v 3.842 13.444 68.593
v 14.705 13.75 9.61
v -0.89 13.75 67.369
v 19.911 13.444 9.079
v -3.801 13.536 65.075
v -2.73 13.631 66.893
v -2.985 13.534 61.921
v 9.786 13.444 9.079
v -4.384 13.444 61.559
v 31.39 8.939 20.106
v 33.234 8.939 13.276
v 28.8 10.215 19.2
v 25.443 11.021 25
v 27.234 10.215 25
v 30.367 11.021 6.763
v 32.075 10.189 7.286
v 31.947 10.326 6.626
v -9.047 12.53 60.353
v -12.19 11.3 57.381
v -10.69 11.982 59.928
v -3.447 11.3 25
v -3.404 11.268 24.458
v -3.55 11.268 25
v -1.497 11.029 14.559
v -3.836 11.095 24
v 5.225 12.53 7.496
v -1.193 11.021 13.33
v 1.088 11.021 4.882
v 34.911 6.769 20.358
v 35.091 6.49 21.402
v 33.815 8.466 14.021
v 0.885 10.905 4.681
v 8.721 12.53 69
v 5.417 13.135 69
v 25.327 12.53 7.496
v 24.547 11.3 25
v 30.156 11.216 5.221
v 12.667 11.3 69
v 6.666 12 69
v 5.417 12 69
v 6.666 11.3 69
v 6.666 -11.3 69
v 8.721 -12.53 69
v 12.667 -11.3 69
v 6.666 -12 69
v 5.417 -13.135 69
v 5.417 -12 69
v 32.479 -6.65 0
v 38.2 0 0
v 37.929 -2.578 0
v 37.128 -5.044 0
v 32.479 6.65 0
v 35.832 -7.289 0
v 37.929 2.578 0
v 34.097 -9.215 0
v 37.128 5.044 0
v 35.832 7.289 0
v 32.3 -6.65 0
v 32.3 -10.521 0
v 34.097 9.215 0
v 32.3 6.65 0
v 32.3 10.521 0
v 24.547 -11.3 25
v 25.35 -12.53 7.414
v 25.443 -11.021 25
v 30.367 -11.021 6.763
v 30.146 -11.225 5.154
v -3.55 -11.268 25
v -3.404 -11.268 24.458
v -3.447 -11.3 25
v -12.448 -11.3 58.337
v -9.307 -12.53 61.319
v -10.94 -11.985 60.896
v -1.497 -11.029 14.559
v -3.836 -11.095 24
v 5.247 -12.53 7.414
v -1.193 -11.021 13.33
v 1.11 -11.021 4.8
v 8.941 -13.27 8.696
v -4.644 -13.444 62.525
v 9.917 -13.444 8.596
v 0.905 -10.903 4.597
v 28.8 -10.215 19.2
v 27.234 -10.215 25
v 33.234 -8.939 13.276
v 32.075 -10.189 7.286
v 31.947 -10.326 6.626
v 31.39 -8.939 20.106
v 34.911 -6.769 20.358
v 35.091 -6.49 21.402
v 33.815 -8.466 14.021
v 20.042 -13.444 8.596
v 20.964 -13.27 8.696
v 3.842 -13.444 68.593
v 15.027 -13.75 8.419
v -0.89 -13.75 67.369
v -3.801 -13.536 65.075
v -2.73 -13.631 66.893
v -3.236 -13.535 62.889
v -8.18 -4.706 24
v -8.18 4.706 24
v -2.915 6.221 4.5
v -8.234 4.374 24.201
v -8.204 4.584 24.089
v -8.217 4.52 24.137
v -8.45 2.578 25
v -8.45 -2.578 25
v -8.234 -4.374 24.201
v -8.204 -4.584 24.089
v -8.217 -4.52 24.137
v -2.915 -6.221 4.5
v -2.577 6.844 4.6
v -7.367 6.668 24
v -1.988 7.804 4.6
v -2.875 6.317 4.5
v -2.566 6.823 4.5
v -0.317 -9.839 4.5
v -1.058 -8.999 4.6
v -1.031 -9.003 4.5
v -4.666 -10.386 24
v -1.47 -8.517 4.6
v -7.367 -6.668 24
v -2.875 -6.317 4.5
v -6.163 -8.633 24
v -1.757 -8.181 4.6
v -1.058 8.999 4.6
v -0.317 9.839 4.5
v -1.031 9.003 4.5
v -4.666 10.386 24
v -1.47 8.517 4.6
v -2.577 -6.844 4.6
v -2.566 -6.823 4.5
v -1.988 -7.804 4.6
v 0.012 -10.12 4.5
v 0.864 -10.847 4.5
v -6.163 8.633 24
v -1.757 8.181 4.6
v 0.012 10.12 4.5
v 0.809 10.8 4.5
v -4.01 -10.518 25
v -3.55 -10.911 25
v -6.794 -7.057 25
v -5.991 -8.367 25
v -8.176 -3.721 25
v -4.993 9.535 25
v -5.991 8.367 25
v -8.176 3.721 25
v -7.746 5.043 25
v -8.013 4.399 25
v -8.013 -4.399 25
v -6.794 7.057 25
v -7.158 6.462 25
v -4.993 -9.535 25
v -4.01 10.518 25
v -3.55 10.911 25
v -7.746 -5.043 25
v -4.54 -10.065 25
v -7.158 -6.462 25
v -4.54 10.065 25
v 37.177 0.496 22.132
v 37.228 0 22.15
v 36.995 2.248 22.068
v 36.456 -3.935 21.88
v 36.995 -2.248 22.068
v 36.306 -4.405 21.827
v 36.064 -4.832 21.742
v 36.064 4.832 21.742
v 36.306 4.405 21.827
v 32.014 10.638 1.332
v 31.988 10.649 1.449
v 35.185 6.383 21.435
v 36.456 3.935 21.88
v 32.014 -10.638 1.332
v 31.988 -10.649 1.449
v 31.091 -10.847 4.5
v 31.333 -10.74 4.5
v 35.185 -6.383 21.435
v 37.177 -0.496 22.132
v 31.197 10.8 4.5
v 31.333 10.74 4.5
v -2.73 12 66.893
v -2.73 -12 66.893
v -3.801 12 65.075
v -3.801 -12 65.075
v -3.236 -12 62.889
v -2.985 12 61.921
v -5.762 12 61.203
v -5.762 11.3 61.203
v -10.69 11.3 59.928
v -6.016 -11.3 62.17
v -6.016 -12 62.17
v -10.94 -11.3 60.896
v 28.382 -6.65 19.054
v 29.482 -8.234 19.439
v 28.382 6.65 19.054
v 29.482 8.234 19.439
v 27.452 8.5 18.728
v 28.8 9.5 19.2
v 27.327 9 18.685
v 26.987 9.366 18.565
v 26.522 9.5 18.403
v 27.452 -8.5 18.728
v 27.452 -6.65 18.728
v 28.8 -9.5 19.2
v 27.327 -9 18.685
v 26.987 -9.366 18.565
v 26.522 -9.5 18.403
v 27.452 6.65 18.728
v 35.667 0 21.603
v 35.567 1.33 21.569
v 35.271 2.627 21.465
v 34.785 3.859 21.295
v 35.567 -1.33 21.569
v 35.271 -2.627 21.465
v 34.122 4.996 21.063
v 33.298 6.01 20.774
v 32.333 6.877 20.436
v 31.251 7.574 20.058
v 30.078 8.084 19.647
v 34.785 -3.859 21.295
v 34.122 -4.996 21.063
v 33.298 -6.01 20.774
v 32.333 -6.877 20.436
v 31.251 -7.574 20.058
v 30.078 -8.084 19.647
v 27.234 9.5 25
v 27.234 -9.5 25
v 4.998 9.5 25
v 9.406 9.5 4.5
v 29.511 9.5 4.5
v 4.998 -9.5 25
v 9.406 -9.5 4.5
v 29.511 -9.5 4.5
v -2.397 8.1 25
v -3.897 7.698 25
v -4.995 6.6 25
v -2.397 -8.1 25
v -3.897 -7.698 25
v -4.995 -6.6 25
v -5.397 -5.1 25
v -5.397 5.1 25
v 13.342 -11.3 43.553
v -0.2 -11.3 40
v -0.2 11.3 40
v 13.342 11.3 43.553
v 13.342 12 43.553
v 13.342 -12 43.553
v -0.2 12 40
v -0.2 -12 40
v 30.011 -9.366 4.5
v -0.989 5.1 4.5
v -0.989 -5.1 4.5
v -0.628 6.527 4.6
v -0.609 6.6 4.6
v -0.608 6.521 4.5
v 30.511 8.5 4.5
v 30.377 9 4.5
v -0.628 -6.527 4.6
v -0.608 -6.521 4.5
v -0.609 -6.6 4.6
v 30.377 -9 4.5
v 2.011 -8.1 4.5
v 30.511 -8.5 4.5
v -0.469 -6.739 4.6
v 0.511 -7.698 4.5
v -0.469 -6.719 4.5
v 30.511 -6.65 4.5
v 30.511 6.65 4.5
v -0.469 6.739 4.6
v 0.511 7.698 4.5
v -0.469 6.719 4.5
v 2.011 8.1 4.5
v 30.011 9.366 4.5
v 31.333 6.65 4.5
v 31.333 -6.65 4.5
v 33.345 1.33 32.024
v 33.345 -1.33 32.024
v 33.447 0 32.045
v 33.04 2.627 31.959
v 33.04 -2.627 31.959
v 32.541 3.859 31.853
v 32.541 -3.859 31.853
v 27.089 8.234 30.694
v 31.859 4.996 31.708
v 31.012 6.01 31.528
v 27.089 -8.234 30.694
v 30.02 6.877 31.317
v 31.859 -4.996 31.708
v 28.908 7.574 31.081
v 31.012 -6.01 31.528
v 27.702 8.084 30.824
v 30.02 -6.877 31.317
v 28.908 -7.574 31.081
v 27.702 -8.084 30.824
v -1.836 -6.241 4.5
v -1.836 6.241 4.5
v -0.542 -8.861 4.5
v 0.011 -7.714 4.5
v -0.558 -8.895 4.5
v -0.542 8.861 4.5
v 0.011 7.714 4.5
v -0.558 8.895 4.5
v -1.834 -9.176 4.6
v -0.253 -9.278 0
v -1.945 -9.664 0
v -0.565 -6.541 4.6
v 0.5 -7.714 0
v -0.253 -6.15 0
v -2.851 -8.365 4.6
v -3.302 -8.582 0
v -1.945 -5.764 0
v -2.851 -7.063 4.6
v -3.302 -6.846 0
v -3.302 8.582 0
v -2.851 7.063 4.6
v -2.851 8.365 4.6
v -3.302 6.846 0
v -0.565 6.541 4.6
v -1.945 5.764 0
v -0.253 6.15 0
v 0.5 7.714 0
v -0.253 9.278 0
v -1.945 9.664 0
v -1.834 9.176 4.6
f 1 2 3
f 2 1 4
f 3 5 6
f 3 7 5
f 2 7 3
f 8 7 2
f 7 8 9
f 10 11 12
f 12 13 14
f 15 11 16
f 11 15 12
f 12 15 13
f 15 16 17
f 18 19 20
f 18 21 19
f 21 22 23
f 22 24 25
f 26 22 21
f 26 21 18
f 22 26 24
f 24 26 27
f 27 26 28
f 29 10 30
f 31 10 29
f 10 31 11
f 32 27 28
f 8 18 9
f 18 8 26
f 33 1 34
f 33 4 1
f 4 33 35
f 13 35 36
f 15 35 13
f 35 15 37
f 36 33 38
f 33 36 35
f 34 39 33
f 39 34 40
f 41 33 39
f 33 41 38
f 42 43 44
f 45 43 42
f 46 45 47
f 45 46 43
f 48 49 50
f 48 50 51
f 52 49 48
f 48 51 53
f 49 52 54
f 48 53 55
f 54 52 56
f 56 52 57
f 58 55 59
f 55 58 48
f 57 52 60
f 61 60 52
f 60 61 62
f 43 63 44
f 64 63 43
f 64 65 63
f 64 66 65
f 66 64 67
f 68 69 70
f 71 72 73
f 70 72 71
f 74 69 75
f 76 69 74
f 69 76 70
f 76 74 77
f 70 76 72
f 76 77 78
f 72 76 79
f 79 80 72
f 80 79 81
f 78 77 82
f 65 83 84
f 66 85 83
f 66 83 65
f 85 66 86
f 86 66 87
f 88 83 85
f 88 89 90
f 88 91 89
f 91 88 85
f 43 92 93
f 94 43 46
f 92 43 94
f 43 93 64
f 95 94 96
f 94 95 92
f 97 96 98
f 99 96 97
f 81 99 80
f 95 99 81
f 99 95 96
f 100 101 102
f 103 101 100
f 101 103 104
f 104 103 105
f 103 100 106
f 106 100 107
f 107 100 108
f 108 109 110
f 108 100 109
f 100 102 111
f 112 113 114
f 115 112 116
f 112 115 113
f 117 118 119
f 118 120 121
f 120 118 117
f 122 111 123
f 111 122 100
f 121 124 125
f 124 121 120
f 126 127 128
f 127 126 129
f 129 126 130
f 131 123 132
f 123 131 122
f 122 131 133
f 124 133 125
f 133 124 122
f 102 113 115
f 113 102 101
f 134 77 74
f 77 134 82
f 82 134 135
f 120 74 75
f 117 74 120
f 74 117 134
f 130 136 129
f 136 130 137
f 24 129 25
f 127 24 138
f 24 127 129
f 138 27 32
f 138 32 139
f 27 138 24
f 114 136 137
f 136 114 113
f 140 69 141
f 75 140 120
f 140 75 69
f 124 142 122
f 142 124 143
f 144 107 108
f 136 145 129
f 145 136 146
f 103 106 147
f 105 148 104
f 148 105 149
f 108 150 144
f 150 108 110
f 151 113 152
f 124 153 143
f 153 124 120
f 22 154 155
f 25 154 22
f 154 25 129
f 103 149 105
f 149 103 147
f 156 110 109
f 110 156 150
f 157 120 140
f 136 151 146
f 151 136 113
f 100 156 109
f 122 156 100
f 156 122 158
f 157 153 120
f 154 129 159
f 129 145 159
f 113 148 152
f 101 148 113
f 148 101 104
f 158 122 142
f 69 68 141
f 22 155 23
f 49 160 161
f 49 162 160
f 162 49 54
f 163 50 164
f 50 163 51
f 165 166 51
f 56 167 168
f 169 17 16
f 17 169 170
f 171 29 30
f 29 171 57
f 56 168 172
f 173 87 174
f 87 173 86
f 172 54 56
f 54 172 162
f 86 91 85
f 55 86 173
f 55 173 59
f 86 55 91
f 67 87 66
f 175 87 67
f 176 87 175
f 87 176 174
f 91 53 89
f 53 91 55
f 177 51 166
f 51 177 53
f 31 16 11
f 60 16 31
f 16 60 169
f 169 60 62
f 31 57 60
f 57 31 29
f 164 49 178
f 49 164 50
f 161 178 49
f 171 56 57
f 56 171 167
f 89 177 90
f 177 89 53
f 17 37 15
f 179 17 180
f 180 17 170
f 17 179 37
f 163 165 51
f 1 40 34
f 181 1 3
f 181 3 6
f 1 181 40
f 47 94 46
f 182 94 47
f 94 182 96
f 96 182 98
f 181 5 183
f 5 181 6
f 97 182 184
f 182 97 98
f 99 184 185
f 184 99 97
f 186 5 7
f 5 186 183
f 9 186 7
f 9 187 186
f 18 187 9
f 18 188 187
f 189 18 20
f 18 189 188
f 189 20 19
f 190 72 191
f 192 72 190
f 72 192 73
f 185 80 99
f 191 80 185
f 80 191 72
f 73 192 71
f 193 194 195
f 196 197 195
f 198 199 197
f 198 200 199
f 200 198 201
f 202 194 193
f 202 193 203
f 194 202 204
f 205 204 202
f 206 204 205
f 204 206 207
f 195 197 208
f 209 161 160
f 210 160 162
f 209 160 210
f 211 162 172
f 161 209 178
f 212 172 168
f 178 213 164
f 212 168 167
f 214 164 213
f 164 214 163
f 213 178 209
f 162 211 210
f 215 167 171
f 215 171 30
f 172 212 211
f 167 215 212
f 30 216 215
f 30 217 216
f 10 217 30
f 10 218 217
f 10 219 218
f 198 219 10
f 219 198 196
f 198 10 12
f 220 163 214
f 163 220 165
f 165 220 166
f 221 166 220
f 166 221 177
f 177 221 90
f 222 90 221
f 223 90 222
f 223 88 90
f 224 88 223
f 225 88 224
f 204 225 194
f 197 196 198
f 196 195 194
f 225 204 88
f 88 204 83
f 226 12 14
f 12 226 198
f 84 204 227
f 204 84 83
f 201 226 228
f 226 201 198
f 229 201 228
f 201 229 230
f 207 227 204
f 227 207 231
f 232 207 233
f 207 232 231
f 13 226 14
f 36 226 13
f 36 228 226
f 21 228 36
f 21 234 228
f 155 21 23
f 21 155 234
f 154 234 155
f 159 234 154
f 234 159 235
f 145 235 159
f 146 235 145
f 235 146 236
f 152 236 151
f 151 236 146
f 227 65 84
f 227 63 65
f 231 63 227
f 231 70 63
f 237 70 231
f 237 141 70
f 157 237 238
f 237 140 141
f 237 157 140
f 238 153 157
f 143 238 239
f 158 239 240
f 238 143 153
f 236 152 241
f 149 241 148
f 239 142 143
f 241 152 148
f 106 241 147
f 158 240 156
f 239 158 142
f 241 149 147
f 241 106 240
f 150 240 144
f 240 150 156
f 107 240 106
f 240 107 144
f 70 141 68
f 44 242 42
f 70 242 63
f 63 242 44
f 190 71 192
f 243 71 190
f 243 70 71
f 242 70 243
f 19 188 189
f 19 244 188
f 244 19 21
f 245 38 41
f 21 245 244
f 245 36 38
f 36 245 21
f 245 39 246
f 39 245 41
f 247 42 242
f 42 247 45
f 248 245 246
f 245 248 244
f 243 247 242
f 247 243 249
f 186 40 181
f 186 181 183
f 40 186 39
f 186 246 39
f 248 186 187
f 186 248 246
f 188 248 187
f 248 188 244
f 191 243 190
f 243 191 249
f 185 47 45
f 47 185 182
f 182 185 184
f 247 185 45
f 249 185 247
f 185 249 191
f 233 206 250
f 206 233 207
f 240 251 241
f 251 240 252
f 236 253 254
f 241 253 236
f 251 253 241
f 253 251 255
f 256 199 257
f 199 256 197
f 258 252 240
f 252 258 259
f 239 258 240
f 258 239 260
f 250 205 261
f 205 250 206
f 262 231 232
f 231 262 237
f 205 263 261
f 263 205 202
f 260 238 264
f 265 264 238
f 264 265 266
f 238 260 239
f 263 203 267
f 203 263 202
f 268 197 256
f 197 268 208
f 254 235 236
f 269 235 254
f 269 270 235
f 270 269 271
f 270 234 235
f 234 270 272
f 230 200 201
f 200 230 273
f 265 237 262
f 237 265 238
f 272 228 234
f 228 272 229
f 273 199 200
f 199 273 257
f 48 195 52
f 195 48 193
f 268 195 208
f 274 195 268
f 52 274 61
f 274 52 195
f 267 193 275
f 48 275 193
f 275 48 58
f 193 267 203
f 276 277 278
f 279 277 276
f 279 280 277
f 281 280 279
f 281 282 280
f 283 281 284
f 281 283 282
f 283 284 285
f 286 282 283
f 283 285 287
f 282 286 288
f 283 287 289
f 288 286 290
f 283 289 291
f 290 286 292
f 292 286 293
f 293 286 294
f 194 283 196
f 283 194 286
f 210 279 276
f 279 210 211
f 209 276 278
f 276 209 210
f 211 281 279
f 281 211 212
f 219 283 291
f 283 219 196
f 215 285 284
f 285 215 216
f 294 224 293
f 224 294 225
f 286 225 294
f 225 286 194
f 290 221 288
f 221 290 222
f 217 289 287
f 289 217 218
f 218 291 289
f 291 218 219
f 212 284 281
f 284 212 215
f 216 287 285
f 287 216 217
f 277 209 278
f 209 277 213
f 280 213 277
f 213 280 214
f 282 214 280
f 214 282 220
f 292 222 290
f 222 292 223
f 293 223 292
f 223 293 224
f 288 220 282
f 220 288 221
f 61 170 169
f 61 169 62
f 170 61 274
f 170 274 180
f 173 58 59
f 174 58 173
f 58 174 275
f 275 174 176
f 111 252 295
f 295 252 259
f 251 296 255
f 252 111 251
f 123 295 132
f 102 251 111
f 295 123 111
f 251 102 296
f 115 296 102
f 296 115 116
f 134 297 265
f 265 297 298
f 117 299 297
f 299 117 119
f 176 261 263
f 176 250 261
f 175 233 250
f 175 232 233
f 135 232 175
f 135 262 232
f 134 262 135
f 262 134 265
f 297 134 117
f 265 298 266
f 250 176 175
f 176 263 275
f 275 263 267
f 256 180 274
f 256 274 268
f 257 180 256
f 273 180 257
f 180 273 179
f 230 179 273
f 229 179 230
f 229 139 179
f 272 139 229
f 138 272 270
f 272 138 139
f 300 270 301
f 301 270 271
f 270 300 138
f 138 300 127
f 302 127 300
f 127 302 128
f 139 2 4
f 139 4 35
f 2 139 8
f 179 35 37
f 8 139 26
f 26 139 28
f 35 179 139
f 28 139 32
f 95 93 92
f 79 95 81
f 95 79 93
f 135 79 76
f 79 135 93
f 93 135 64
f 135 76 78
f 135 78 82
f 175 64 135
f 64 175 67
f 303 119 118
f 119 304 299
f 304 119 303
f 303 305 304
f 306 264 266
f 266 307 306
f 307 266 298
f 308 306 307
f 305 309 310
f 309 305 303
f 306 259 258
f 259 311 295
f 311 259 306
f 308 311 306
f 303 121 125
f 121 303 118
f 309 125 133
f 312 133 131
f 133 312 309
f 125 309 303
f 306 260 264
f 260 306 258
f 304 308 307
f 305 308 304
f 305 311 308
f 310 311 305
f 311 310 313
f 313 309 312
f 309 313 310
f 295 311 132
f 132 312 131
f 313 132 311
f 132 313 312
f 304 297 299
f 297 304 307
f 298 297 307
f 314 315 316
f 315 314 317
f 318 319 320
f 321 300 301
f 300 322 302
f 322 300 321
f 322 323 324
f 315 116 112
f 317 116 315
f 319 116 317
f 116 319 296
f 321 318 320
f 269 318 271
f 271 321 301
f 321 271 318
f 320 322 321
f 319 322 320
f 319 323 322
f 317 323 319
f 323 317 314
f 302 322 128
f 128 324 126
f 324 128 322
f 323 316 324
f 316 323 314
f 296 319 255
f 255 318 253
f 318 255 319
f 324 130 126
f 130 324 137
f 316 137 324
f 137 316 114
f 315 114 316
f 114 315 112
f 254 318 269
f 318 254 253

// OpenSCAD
//
// Glock(r) 42 grip extension "G42K"
//
// For use with ETS 9-round magazines.
//
// Copyright (c) 2019 Pete Zaitcev
//

use <g42k.scad>;

cutout_height = 4.5;

// XXX make butt_width a parameter of some kind
butt_width = 26.6;

difference () {
    g42k_base();

    // The main cut-out, a slant cube
    multmatrix(m = [[   1,   0,  -0.215, 0],
                    [   0,   1,   0,     0],
                    [   0,   0,   1,     0],
                    [   0,   0,   0,     1]])
    {
        translate([-2, ((butt_width * 1.1)/2)*-1, -0.1])
            cube([34.3, butt_width * 1.1, cutout_height+0.1]);
    }

    // Scalloping for forceful removal of the magazine
    translate([0, butt_width/2 - 2.5, 4.5]) {
        rotate(-30, [1,0,0])
            cube([31.2, 5, 6]);
    }
    translate([0, (butt_width/2 + 1.3)*-1, 1.0]) {
        rotate(30, [1,0,0])
            cube([31.2, 5, 6]);
    }
}

// Ouch. When printing from ABS, the large overhang makes the part warp
// and detach from the automacally generated support lattice. We add a
// couple of columns that need to be cut away from the ready part.
translate([-1.5, (butt_width*0.29)*-1, 0])
    cylinder(cutout_height+0.1, 2, 1.5);
translate([-1.5, butt_width*0.29, 0])
    cylinder(cutout_height+0.1, 2, 1.5);
